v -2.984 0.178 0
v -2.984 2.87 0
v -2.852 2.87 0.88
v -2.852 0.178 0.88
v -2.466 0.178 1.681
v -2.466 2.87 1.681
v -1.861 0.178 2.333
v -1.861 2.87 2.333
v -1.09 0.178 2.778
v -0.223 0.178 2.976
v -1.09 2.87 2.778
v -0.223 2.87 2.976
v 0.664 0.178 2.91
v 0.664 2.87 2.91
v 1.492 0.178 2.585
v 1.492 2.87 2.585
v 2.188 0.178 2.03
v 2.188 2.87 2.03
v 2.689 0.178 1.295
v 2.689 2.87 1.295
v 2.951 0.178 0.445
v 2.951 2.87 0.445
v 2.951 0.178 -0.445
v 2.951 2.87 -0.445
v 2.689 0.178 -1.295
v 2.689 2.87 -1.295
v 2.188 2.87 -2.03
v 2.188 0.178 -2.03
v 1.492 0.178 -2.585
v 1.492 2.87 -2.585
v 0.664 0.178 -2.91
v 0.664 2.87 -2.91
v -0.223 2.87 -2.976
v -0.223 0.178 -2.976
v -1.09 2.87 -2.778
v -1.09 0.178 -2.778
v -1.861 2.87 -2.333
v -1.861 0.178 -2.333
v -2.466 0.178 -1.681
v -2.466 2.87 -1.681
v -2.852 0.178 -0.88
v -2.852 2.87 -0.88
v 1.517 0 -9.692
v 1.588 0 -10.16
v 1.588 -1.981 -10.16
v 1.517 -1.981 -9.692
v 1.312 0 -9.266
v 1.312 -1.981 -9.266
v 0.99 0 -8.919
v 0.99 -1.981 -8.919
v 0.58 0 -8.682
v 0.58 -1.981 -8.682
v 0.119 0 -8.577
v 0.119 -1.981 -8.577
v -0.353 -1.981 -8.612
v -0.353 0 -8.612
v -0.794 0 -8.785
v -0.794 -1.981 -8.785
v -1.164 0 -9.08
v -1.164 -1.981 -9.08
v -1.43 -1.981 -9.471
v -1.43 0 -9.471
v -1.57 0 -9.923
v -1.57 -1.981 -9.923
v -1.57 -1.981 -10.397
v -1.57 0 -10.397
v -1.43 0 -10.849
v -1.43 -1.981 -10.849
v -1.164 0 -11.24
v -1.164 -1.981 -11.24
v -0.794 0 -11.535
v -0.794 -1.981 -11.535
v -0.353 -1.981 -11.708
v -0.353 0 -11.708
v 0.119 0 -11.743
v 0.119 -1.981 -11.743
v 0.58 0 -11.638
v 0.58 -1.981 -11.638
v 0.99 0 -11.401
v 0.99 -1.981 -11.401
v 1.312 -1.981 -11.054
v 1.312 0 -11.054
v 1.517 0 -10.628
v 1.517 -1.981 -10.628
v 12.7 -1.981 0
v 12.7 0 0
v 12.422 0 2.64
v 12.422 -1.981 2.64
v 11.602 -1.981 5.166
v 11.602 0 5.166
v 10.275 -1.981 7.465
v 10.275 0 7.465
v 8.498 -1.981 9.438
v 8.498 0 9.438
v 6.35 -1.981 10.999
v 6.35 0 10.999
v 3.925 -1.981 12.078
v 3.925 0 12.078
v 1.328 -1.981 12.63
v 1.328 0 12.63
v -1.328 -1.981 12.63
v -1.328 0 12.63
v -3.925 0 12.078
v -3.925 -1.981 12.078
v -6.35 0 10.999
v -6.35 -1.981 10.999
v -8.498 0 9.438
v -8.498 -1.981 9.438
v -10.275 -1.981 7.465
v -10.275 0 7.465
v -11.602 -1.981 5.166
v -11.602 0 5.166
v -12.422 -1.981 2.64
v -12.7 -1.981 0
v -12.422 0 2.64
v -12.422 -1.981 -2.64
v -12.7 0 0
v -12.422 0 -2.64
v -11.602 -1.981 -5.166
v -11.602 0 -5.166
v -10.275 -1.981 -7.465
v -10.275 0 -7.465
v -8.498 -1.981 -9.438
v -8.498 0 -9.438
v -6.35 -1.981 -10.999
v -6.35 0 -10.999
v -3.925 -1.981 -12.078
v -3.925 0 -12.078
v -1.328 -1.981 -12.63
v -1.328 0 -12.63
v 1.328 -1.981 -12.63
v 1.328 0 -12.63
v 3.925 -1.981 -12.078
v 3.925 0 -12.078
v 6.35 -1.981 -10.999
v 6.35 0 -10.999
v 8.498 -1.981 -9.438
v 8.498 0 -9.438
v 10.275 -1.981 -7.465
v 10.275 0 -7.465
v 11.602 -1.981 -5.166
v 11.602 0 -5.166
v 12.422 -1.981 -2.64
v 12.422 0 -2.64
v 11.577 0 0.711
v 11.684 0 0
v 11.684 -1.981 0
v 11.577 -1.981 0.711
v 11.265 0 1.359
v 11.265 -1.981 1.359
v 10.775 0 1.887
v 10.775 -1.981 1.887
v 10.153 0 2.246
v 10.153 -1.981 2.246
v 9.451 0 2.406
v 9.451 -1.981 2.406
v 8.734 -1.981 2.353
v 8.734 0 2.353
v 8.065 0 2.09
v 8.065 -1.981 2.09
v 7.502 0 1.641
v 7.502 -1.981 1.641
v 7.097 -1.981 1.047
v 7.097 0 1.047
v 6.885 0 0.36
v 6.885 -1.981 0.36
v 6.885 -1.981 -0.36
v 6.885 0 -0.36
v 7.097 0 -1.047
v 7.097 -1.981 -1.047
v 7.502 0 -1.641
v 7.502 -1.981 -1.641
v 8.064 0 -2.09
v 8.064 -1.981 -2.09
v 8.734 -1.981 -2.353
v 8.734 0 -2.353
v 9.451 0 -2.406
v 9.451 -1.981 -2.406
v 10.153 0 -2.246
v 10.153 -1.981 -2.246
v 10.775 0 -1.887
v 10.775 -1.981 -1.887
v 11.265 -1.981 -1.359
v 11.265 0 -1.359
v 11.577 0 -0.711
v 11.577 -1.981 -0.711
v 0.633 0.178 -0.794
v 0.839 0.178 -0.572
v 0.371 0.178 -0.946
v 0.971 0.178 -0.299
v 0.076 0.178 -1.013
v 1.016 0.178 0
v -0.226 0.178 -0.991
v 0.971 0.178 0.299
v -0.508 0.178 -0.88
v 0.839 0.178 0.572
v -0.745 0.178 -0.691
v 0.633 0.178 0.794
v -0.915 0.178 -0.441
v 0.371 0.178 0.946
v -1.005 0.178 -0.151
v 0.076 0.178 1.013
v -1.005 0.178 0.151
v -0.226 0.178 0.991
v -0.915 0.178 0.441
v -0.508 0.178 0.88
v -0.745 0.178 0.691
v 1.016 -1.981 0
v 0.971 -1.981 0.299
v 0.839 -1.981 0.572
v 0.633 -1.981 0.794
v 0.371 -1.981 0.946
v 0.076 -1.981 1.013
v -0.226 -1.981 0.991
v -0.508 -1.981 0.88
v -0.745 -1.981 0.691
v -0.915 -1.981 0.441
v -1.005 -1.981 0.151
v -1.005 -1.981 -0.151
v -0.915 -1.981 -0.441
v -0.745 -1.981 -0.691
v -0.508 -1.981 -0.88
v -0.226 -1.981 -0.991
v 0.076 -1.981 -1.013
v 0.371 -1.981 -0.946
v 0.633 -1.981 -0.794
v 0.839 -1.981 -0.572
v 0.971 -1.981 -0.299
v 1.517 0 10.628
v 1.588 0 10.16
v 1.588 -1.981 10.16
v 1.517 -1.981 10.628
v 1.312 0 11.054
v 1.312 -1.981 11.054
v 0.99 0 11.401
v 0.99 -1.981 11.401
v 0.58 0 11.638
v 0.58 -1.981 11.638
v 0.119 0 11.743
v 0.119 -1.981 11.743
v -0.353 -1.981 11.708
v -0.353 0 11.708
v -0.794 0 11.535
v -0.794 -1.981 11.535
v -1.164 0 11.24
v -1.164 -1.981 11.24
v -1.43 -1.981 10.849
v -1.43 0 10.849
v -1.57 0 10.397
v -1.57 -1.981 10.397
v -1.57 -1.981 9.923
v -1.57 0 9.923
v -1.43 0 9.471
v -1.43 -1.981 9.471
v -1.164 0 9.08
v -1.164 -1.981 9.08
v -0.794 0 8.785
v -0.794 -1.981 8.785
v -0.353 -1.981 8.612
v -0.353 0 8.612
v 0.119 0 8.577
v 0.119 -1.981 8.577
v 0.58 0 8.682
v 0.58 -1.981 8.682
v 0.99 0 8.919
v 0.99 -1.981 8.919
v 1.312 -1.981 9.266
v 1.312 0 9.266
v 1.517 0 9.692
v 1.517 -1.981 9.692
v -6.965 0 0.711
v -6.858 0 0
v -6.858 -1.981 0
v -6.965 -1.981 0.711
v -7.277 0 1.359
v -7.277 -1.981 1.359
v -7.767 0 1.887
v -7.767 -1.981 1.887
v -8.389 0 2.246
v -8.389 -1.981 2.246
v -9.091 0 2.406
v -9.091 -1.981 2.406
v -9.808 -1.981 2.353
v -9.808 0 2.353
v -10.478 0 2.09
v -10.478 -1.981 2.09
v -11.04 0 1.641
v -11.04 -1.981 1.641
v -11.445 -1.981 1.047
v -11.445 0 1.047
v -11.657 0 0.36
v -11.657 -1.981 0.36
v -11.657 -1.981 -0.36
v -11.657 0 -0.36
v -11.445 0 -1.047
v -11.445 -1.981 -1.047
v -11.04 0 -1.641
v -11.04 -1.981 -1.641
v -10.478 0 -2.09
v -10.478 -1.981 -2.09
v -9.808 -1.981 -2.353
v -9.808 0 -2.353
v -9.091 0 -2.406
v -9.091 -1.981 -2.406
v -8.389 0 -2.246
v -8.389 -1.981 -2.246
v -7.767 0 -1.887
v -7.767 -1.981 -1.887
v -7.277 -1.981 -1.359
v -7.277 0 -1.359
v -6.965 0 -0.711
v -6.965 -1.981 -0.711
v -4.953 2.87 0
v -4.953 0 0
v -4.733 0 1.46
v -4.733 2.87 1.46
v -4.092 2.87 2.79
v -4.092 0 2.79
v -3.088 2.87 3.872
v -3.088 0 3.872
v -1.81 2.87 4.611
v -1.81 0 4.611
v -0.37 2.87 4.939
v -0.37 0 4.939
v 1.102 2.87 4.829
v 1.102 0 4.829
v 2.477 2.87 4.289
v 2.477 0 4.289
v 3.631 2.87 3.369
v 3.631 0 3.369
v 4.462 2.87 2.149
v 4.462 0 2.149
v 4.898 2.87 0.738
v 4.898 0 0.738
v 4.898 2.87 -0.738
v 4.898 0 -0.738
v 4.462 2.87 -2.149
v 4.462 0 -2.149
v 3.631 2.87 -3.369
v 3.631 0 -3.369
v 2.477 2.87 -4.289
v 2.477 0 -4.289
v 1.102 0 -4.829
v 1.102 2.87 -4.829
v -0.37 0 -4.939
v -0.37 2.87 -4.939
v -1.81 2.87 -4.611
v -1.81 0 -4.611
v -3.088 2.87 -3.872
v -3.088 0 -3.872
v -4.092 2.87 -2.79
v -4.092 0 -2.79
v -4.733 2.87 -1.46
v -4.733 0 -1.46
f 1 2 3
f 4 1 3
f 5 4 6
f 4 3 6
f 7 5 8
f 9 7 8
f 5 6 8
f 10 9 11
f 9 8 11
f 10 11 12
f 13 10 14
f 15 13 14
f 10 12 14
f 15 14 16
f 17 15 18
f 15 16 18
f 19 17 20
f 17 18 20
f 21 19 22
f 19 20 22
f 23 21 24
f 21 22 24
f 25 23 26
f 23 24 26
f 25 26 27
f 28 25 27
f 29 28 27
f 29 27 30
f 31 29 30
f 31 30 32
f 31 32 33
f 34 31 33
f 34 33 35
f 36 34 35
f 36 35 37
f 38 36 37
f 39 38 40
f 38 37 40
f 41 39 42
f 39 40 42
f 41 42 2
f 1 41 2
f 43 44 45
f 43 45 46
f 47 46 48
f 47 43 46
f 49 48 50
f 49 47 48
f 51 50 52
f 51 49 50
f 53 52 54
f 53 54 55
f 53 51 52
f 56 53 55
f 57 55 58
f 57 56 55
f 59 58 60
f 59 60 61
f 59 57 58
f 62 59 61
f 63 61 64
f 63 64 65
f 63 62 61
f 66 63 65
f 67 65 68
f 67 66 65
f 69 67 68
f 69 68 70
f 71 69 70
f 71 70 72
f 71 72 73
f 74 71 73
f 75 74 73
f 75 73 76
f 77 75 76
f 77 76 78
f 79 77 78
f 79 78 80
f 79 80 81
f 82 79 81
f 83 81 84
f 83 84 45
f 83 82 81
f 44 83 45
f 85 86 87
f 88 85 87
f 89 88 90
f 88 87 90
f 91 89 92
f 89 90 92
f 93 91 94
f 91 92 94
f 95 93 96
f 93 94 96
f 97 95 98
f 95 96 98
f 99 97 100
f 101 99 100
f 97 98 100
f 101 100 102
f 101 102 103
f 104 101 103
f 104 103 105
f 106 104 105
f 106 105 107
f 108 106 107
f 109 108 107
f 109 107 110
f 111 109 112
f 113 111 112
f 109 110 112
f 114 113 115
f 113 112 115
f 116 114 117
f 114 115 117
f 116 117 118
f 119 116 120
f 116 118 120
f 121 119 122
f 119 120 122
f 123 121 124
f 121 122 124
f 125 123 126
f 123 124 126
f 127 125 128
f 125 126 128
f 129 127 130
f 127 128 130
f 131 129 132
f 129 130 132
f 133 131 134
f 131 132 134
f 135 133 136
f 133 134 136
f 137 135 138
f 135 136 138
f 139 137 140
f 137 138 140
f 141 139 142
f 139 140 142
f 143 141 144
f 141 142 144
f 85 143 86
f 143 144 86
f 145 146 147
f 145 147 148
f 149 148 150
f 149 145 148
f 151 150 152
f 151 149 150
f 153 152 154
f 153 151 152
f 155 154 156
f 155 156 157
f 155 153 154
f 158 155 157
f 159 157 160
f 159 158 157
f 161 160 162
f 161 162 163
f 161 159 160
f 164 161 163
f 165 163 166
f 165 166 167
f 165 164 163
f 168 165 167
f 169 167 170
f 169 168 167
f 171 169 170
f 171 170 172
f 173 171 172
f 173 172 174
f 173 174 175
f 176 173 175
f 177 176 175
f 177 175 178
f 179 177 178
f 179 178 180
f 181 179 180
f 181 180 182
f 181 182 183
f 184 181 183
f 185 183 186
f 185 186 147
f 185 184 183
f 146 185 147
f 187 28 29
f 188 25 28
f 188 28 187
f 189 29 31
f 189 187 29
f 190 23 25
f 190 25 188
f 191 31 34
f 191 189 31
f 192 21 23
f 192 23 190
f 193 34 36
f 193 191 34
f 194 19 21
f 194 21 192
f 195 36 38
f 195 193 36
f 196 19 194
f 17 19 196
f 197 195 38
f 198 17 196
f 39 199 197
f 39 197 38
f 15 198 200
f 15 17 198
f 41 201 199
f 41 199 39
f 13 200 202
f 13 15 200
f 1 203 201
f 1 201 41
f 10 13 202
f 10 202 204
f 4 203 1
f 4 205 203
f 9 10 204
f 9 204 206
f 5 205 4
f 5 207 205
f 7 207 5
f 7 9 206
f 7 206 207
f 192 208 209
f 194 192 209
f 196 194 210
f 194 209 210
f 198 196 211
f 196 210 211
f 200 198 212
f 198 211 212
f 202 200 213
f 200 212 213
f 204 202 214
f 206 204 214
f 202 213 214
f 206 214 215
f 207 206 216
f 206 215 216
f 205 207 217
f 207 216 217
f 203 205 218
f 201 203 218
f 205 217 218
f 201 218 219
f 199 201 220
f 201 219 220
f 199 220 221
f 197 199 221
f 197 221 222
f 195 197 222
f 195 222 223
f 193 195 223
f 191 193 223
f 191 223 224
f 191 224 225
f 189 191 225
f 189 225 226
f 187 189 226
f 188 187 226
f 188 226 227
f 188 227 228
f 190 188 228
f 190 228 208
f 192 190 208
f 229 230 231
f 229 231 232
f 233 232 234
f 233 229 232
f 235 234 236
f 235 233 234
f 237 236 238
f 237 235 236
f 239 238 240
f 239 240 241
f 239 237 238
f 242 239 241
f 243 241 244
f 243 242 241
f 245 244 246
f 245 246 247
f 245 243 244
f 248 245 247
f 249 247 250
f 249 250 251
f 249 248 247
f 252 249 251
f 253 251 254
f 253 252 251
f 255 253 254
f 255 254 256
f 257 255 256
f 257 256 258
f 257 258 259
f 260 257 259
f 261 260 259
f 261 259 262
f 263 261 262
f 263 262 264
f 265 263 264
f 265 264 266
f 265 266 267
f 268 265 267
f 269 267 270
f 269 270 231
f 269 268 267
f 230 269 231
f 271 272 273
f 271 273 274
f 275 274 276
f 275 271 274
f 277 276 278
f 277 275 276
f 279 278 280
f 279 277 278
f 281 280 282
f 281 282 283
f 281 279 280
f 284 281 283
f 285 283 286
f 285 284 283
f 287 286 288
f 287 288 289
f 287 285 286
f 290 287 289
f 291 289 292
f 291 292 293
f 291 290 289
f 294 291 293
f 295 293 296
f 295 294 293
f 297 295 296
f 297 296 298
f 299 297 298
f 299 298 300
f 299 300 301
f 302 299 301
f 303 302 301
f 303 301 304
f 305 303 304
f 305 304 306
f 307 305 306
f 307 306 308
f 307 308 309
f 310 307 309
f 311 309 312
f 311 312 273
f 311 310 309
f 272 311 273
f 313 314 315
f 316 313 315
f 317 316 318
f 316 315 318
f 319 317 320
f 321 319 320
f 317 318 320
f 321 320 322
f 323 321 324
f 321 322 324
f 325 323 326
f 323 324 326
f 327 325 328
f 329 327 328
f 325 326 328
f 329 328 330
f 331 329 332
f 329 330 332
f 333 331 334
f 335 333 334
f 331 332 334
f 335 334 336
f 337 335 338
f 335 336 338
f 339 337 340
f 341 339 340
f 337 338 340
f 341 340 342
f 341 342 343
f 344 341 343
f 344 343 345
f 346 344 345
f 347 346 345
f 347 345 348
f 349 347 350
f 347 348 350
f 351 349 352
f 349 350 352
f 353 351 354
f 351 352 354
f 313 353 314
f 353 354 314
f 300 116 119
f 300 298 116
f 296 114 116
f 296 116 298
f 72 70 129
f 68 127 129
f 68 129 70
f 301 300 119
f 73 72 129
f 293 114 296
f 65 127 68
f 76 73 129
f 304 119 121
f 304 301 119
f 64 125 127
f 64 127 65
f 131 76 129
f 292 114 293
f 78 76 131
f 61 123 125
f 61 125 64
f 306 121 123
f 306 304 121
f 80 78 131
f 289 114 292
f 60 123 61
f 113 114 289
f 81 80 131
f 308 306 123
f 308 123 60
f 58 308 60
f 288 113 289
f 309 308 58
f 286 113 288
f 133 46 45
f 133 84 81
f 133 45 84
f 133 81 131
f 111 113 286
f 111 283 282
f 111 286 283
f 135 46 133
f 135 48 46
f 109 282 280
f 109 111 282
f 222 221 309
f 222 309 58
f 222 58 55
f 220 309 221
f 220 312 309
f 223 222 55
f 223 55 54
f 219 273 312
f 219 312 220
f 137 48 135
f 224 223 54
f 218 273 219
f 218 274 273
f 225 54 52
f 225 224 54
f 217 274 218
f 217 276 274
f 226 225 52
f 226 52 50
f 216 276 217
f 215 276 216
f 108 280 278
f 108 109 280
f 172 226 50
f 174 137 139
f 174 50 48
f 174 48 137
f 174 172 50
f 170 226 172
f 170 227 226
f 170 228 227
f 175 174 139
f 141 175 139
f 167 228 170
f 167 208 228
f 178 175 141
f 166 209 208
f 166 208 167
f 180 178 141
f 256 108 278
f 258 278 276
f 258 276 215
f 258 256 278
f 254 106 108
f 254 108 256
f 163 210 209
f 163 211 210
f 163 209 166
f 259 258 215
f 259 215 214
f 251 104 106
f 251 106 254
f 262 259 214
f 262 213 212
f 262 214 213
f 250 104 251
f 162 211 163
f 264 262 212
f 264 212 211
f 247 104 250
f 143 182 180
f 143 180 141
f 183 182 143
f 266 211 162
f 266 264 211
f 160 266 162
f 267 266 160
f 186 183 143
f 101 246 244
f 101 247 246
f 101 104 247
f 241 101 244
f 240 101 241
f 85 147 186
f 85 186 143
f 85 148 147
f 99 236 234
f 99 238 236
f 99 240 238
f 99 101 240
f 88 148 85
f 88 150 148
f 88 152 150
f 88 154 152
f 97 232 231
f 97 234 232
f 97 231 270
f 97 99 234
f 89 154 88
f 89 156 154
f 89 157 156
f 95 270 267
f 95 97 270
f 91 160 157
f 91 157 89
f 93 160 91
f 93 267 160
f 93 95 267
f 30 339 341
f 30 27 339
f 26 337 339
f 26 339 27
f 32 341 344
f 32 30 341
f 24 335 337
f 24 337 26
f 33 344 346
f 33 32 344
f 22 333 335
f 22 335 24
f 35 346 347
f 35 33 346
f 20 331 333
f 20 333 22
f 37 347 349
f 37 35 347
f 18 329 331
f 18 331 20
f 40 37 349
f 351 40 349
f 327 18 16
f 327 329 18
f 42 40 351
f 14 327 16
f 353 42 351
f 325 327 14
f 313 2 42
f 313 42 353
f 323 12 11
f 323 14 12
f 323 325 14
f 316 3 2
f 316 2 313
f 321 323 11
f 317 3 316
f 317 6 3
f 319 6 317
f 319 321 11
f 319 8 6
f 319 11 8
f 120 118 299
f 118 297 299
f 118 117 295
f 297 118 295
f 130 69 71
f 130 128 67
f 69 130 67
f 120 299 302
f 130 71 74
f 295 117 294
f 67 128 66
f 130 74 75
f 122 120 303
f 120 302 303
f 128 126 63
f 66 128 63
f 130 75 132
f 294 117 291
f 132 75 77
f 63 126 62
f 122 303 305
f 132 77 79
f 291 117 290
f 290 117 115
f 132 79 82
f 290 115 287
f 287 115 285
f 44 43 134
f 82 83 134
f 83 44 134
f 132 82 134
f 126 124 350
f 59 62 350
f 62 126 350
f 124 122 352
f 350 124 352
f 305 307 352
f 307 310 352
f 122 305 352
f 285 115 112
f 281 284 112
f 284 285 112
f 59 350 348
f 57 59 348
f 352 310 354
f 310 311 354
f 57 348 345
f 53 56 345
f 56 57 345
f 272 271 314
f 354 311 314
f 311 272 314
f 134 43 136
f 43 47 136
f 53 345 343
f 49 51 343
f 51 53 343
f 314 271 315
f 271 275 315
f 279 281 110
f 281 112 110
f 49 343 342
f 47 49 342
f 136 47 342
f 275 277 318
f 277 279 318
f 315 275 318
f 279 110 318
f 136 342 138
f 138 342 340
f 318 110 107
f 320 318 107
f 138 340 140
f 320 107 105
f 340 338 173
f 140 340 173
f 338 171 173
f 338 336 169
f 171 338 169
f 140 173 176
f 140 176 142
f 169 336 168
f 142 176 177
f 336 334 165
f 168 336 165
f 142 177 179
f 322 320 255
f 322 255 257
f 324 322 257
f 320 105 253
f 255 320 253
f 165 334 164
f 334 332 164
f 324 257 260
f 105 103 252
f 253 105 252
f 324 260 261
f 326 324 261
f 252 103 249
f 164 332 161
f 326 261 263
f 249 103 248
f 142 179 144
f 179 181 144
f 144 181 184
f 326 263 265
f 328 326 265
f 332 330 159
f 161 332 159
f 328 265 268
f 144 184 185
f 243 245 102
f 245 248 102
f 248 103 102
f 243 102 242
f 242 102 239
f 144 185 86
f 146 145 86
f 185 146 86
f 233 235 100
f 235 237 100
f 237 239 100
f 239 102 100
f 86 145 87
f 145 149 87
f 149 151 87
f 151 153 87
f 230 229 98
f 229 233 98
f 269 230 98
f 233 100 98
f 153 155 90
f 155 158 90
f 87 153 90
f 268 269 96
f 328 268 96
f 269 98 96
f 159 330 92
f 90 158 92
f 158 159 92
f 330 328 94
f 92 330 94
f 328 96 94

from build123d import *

# Parameters (mm, degrees)
F0_R     = 12.7
F0_R_2   = 1.5875
F0_R_3   = 2.413
F1_DEPTH = 1.9812
F2_R     = 4.953
F3_DEPTH = 2.8702
F4_R     = 2.9845
F5_DEPTH = 2.6924
F6_R     = 1.016
F7_DEPTH = 4.8524


with BuildPart() as f1:
    # F0 (on Front) → F1 (new body)
    with BuildSketch(Plane.XZ):
        Circle(F0_R)
        with Locations((0, -10.16)):
            Circle(F0_R_2, mode=Mode.SUBTRACT)
        with Locations((-9.271, 0)):
            Circle(F0_R_3, mode=Mode.SUBTRACT)
        with Locations((9.271, 0)):
            Circle(F0_R_3, mode=Mode.SUBTRACT)
        with Locations((0, 10.16)):
            Circle(F0_R_2, mode=Mode.SUBTRACT)
    extrude(amount=F1_DEPTH)

    # F2 (on face) → F3 (join)
    with BuildSketch(Plane(origin=(0, 0, 0), x_dir=(-1, 0, 0), z_dir=(0, 1, 0))):
        Circle(F2_R)
    extrude(amount=F3_DEPTH)

    # F4 (on face) → F5 (cut)
    with BuildSketch(Plane(origin=(0, 2.8702, 0), x_dir=(-1, 0, 0), z_dir=(0, 1, 0))):
        Circle(F4_R)
    extrude(amount=-F5_DEPTH, mode=Mode.SUBTRACT)

    # F6 (on face) → F7 (cut, through all)
    with BuildSketch(Plane.XZ.offset(1.9812)):
        Circle(F6_R)
    extrude(amount=-F7_DEPTH, mode=Mode.SUBTRACT)


solid = f1.part
